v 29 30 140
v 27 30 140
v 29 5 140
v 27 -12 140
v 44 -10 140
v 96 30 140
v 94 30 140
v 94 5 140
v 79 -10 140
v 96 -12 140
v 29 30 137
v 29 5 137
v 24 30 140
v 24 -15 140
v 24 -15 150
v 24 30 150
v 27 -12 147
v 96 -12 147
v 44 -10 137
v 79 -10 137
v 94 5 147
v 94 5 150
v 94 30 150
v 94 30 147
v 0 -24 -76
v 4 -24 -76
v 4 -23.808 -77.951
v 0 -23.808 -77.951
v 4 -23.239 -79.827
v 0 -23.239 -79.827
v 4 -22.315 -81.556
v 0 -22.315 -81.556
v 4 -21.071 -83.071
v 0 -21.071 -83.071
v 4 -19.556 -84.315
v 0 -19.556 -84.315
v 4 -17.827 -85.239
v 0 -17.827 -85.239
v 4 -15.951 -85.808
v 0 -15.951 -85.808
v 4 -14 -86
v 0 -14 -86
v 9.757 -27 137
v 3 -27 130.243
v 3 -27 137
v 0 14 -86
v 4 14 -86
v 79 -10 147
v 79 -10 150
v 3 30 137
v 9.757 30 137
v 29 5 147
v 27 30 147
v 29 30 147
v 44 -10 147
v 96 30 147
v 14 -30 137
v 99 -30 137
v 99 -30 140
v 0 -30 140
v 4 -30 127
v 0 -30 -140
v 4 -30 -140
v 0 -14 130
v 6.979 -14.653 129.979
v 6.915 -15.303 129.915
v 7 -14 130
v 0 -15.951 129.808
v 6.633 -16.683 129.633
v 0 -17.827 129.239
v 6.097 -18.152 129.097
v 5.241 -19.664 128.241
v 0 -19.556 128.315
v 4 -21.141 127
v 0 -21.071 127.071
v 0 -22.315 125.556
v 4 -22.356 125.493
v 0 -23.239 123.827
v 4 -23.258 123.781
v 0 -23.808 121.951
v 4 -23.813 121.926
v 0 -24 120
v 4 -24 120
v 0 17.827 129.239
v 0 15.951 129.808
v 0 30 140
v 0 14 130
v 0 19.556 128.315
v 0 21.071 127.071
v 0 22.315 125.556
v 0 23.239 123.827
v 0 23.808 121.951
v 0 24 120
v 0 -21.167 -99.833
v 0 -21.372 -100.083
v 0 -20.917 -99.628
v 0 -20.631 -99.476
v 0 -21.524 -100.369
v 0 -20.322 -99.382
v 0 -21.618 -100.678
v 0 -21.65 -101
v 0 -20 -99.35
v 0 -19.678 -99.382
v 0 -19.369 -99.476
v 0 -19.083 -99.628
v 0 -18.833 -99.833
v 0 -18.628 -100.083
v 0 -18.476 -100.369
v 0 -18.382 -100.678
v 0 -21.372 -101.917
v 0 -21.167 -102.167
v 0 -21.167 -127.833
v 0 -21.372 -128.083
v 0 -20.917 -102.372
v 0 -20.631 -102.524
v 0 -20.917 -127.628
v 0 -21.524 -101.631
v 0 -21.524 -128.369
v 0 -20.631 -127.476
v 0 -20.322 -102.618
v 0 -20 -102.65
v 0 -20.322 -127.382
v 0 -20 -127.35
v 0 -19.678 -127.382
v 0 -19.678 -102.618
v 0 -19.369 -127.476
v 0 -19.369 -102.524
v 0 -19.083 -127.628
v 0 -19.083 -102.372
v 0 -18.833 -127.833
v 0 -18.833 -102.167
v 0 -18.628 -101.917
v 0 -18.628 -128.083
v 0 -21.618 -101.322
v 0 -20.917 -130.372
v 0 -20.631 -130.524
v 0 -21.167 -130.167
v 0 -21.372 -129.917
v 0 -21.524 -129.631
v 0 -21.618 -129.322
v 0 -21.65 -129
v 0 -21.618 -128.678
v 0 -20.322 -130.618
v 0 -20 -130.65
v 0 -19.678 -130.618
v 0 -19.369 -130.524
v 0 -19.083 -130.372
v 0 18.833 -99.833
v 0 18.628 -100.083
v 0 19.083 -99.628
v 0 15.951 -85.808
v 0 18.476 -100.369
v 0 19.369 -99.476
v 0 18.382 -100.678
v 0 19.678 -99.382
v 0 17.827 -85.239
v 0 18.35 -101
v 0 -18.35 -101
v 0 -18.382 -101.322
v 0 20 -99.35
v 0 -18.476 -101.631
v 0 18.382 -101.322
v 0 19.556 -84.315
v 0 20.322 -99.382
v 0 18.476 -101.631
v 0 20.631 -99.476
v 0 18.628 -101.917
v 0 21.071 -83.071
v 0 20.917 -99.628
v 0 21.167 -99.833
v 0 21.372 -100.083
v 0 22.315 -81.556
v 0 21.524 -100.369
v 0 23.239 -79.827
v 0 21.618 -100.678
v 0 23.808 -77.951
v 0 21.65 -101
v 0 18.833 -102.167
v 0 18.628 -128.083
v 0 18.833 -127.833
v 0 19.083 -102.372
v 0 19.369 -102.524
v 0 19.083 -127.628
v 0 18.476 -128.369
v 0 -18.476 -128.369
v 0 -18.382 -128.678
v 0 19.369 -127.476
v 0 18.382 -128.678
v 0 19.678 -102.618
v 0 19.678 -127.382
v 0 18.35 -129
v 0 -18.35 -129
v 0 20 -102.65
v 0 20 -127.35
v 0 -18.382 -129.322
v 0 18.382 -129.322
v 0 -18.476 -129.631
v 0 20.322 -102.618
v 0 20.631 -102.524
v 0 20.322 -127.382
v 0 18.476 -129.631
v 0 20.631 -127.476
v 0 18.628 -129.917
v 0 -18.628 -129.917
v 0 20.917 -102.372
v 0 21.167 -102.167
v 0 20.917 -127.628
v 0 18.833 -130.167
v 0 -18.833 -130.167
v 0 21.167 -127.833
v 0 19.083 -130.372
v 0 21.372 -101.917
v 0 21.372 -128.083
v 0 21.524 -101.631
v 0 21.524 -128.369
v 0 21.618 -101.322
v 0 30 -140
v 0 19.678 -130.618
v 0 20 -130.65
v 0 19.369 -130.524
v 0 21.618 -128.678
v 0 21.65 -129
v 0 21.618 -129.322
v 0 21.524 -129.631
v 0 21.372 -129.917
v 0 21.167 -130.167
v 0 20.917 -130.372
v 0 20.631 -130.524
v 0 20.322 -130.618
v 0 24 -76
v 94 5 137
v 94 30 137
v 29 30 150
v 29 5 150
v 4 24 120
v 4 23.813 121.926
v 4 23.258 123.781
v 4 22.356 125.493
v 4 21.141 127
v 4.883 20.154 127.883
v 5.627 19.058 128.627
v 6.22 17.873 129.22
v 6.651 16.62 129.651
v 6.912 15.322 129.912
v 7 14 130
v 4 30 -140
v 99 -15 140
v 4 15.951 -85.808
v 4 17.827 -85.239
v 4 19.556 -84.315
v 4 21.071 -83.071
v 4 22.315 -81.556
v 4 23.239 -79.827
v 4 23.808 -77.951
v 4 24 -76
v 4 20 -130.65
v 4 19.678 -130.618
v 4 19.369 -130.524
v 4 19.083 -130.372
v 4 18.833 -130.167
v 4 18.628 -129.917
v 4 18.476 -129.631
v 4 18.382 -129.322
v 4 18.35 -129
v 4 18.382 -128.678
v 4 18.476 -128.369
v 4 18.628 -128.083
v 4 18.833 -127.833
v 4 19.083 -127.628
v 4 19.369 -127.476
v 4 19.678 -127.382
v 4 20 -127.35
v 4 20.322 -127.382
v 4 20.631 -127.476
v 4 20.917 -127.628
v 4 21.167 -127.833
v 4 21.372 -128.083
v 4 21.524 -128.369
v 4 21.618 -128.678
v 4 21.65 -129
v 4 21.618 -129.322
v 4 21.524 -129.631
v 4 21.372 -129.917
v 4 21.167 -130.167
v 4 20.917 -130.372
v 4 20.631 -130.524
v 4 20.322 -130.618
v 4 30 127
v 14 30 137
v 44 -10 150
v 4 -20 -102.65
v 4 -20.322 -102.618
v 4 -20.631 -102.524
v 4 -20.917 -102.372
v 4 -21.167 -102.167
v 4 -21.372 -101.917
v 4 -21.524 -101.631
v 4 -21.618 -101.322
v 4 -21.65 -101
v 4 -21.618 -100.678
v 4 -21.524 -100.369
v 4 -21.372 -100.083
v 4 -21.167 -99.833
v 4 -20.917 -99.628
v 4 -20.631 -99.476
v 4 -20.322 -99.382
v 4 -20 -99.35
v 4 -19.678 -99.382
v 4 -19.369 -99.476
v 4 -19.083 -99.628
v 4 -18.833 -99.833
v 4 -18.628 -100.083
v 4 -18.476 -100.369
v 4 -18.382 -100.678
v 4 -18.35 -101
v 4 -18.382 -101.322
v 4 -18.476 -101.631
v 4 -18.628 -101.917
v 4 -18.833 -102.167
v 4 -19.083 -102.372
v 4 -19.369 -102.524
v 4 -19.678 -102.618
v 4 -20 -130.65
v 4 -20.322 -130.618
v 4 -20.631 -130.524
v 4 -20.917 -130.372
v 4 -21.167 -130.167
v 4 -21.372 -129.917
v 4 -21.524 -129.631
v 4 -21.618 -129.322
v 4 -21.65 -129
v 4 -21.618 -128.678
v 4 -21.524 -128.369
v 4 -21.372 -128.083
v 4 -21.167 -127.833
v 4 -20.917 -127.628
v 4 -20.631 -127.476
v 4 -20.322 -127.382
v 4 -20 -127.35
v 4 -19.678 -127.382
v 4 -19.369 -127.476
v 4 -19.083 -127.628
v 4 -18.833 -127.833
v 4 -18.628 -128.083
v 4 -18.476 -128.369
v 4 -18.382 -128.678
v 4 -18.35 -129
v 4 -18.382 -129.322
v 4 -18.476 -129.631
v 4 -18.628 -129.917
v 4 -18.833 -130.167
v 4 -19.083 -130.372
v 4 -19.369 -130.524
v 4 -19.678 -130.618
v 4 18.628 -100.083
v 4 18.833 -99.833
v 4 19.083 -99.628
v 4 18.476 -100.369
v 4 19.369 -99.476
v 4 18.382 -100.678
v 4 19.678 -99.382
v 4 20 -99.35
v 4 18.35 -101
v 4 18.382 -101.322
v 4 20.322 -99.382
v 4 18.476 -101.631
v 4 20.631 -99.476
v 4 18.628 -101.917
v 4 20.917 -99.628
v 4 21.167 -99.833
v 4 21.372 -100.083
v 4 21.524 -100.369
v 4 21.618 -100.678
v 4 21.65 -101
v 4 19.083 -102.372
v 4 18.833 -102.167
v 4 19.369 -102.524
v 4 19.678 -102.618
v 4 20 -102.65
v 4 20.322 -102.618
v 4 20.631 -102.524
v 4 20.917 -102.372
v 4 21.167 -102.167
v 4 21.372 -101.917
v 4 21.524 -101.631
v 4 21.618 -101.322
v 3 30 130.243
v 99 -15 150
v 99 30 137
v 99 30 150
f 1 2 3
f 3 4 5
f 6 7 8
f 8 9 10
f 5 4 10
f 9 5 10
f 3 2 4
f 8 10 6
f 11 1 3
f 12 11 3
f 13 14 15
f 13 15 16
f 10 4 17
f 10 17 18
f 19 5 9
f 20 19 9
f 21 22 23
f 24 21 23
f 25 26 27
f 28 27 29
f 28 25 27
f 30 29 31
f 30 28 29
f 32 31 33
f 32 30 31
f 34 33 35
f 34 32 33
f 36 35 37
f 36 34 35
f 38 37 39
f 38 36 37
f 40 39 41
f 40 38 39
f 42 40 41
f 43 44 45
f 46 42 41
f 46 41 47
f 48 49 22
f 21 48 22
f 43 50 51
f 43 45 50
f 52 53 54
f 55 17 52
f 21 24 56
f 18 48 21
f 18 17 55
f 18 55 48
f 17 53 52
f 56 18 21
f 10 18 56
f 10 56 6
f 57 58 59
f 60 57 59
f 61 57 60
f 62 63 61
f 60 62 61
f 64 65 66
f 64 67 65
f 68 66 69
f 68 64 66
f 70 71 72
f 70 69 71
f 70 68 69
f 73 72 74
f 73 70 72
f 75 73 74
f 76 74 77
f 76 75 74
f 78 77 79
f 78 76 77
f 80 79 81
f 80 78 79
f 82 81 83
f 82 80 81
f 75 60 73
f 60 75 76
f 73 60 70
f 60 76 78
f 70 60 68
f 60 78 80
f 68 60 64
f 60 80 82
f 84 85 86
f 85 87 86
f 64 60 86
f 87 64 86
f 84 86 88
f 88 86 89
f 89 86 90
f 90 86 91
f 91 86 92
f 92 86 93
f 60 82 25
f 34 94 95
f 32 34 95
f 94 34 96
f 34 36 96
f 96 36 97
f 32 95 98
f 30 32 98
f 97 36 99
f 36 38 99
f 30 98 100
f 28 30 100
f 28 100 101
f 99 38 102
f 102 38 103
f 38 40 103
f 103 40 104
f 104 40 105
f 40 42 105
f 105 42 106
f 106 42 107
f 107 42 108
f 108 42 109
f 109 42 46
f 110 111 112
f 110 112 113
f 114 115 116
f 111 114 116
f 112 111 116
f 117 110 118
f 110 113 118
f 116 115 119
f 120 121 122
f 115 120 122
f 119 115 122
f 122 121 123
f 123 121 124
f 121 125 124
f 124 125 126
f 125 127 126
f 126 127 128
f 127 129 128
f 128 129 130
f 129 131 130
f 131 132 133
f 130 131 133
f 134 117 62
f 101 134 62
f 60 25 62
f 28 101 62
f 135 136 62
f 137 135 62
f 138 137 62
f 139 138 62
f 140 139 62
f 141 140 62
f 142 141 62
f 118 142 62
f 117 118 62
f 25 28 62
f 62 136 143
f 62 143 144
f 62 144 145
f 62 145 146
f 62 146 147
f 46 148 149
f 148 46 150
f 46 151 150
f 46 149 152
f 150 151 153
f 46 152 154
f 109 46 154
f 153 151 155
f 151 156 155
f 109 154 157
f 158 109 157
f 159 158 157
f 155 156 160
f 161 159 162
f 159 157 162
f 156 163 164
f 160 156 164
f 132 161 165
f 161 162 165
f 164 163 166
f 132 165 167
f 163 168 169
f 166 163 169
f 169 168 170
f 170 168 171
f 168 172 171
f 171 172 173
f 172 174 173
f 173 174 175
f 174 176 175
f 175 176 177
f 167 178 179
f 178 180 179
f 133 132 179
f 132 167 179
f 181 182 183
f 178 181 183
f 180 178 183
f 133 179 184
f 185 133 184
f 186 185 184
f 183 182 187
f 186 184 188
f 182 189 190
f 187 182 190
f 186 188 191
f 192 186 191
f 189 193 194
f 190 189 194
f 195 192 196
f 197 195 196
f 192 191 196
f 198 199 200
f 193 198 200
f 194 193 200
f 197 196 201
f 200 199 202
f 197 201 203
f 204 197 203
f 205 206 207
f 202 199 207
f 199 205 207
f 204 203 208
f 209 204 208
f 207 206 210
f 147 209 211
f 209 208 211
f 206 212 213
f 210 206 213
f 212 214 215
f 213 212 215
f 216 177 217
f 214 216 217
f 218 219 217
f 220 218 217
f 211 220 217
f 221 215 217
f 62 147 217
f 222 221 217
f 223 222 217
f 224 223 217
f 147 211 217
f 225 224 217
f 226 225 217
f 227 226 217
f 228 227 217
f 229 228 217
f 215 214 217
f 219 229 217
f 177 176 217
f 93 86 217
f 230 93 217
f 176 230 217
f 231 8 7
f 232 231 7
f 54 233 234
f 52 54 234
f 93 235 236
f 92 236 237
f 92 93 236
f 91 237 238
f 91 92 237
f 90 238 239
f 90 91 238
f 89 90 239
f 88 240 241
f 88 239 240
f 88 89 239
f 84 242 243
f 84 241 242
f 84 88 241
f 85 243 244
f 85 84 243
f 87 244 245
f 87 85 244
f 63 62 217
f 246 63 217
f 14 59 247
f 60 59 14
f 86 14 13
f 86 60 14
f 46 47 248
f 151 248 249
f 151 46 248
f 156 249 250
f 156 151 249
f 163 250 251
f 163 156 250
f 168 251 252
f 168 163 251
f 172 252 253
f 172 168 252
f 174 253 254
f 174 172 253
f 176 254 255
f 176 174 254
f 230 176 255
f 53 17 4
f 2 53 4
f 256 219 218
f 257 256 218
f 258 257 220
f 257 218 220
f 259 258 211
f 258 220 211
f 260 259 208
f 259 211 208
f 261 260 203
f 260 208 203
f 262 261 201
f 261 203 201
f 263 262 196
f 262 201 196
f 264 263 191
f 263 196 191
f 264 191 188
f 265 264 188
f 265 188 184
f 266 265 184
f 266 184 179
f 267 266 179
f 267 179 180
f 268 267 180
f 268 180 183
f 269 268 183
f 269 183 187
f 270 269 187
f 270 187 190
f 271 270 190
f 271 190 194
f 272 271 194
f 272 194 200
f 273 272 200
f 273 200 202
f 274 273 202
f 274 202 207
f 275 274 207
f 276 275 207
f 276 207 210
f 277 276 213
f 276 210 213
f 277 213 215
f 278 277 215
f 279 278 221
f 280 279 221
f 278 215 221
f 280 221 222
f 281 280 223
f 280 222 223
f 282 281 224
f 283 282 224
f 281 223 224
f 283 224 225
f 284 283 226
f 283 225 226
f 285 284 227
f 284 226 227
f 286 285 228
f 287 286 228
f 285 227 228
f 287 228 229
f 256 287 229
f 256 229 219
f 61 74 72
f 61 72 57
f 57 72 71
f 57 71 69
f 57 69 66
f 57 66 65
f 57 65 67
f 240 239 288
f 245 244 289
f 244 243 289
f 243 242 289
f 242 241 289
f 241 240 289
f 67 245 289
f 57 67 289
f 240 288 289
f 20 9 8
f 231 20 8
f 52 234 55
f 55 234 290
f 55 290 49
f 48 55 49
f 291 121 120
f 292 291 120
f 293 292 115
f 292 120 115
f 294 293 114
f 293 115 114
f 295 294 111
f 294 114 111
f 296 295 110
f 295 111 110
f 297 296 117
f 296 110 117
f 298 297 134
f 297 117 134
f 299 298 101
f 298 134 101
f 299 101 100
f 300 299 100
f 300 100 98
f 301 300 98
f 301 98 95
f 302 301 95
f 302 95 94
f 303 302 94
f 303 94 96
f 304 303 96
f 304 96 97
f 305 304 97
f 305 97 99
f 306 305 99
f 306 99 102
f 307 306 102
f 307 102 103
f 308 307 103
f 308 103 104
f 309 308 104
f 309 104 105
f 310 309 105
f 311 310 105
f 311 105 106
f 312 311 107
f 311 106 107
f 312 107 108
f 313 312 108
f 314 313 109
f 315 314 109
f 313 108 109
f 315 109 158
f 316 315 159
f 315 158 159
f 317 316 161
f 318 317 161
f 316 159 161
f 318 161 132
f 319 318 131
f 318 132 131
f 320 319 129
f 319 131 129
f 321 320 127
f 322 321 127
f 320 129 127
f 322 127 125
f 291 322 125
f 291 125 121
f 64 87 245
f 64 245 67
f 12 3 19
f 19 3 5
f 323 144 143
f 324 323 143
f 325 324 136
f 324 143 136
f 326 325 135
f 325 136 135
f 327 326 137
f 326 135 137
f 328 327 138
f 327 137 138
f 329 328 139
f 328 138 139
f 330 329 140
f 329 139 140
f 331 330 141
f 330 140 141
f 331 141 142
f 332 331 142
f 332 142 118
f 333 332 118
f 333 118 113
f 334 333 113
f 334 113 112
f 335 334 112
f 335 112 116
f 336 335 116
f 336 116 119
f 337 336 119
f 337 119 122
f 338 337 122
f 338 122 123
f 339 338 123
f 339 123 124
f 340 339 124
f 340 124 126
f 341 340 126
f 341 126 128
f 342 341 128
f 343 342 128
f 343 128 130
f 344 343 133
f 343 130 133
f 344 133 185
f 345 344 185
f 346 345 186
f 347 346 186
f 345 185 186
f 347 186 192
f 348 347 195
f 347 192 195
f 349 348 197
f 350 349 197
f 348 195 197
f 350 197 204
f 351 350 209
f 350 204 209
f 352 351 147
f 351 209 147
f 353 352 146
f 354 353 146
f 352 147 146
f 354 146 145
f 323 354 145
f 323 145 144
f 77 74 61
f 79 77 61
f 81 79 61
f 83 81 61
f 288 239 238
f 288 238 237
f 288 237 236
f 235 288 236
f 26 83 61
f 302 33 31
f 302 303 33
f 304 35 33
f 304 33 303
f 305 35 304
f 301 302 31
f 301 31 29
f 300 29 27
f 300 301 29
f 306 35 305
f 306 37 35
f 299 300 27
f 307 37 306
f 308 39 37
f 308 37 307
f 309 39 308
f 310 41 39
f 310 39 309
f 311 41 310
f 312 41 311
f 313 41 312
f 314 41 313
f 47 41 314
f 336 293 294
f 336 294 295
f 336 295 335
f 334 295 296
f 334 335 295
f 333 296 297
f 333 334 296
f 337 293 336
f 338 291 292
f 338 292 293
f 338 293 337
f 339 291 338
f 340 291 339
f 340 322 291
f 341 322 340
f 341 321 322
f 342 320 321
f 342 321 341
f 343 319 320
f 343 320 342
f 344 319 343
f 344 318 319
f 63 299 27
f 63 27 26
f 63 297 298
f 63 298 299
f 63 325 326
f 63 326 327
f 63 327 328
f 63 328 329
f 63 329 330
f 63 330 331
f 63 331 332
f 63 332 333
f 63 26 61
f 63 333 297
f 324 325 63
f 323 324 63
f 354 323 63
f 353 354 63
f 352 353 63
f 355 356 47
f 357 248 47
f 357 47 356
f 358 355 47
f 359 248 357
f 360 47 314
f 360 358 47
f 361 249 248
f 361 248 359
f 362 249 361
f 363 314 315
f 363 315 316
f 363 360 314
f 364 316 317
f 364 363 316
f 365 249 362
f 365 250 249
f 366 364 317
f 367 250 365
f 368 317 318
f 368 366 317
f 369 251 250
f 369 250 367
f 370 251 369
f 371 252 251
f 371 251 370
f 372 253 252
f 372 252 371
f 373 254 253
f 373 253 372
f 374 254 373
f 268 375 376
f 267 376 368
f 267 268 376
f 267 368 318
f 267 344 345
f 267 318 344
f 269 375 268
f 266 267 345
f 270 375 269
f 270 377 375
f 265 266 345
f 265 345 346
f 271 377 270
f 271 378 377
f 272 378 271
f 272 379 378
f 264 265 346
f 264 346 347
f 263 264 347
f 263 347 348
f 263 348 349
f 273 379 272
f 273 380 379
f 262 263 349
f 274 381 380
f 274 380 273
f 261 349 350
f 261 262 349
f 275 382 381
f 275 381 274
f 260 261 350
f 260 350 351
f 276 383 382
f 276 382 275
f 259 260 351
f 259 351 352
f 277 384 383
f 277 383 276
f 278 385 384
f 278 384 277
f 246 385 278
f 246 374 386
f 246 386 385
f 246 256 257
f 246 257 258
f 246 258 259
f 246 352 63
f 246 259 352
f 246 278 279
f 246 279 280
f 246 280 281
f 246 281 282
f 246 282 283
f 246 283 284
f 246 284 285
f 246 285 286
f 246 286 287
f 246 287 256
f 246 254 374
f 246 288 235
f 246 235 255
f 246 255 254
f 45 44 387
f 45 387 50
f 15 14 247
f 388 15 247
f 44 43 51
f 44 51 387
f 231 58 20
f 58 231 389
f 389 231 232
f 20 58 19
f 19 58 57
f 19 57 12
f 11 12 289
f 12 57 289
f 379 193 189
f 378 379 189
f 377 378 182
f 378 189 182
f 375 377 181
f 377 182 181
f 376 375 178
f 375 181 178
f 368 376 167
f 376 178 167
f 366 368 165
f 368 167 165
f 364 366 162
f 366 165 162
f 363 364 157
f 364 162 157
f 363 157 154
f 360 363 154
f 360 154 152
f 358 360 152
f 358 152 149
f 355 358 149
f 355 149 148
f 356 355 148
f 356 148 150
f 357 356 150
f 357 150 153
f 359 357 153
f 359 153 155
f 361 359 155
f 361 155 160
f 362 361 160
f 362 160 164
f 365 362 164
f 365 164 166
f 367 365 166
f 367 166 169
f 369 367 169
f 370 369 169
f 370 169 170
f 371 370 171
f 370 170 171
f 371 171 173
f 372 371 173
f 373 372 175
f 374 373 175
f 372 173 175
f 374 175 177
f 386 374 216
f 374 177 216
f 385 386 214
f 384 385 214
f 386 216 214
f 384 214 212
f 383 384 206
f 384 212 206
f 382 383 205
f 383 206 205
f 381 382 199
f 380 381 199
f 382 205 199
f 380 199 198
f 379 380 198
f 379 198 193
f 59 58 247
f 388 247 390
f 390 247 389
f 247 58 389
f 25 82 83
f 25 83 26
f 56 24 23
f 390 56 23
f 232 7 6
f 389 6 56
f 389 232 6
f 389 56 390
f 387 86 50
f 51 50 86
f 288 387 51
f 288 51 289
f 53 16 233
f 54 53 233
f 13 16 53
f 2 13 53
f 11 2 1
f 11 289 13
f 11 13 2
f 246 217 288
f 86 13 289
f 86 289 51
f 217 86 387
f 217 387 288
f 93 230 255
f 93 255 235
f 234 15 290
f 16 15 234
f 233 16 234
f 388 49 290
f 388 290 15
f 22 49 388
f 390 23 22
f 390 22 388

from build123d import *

# Parameters (mm, degrees)
SKETCH_1_W          = 280
SKETCH_1_H          = 60
EXTRUDE_1_DEPTH     = 4
HOLE_WIZARD_M4_1_D  = 3.3
SKETCH_10_W         = 3
SKETCH_10_H         = 60
EXTRUDE_4_DEPTH     = 95
EXTRUDE_8_DEPTH     = 60
SKETCH_14_W         = 75
SKETCH_14_H         = 45
EXTRUDE_10_DEPTH    = 10
SHELL_START         = -12
SHELL_1_OUTLINE_W   = 69
SHELL_1_OUTLINE_H   = 7
SHELL_1_DEPTH       = 42
SHELL_START_2       = -27
SHELL_1_2_DEPTH     = 15
CUT_EXTRUDE_2_REACH = 309.898
CUT_EXTRUDE_3_REACH = 184.211


# Read off the part's stored shape, not the designer's step: 抽壳1
with BuildPart() as part:
    # 草图1 → 凸台-拉伸1 (new body)
    with BuildSketch(Plane(origin=(0, 0, 0), x_dir=(0, 0, -1), z_dir=(1, 0, 0))):
        Rectangle(SKETCH_1_W, SKETCH_1_H)
    extrude(amount=EXTRUDE_1_DEPTH)

    # M4 螺纹孔1 (through all)
    with Locations(Plane(origin=(4, 20, -129), x_dir=(0, 0, 1), z_dir=(1, 0, 0))):
        with Locations((0, 0), (28, 0), (28, 40), (0, 40)):
            Hole(HOLE_WIZARD_M4_1_D / 2)

    # 草图10 → 凸台-拉伸4 (add)
    with BuildSketch(Plane(origin=(4, 0, 0), x_dir=(0, 0, -1), z_dir=(1, 0, 0))):
        with Locations((-138.5, 0)):
            Rectangle(SKETCH_10_W, SKETCH_10_H)
    extrude(amount=EXTRUDE_4_DEPTH)

    # 草图11 → 凸台-拉伸8 (add)
    with BuildSketch(Plane(origin=(0, 30, 0), x_dir=(1, 0, 0), z_dir=(0, 1, 0))):
        Polygon((4, -127), (14, -137), (4, -137), align=None)
    extrude(amount=-EXTRUDE_8_DEPTH)

    # 草图14 → 凸台-拉伸10 (add)
    with BuildSketch(Plane.XY.offset(140)):
        with Locations((61.5, 7.5)):
            Rectangle(SKETCH_14_W, SKETCH_14_H)
    extrude(amount=EXTRUDE_10_DEPTH)

    # 抽壳1 outline → 抽壳1 (cut)
    with BuildSketch(Plane(origin=(0, 0, 0), x_dir=(1, 0, 0), z_dir=(0, 1, 0)).offset(SHELL_START)):
        with Locations((61.5, -143.5)):
            Rectangle(SHELL_1_OUTLINE_W, SHELL_1_OUTLINE_H)
        Polygon((3, -137), (9.757359313, -137), (3, -130.242640687), align=None)
    extrude(amount=SHELL_1_DEPTH, mode=Mode.SUBTRACT)

    # Shell 1 2 outline → Shell 1 2 (cut)
    with BuildSketch(Plane(origin=(0, 0, 0), x_dir=(1, 0, 0), z_dir=(0, 1, 0)).offset(SHELL_START_2)):
        Polygon((3, -137), (9.757359313, -137), (3, -130.242640687), align=None)
    extrude(amount=SHELL_1_2_DEPTH, mode=Mode.SUBTRACT)

    # 切除-拉伸2: up to this face of the body (flat: up to its plane)
    cut_extrude_2_end = Plane(part.part.faces().sort_by_distance((56.5, 0, 137))[0])
    # 草图15 → 切除-拉伸2 (cut, up to the picked face)
    with BuildSketch(Plane.XY.offset(150), mode=Mode.PRIVATE) as cut_extrude_2_sk1:
        Polygon((61.5, 30), (29, 30), (29, 5), (44, -10), (61.5, -10), align=None)
    cut_extrude_2_tool1 = split(extrude(cut_extrude_2_sk1.sketch, amount=-CUT_EXTRUDE_2_REACH, mode=Mode.PRIVATE), bisect_by=cut_extrude_2_end, keep=Keep.BOTH, mode=Mode.PRIVATE)
    # 草图15 → 切除-拉伸2 (cut, up to the picked face)
    with BuildSketch(Plane.XY.offset(150), mode=Mode.PRIVATE) as cut_extrude_2_sk2:
        Polygon((94, 30), (61.5, 30), (61.5, -10), (79, -10), (94, 5), align=None)
    cut_extrude_2_tool2 = split(extrude(cut_extrude_2_sk2.sketch, amount=-CUT_EXTRUDE_2_REACH, mode=Mode.PRIVATE), bisect_by=cut_extrude_2_end, keep=Keep.BOTH, mode=Mode.PRIVATE)
    add(cut_extrude_2_tool1.solids().sort_by(Axis((46.315789, 11.421053, 150), (0, 0, -1)))[0], mode=Mode.SUBTRACT)
    add(cut_extrude_2_tool2.solids().sort_by(Axis((76.684211, 11.421053, 150), (0, 0, -1)))[0], mode=Mode.SUBTRACT)

    # 草图16 → 切除-拉伸3 (cut, up to next)
    with BuildSketch(Plane.ZY, mode=Mode.PRIVATE) as cut_extrude_3_sk1:
        with BuildLine():
            Line((-76, 24), (120, 24))
            ThreePointArc((120, 24), (127.071067812, 21.071067812), (130, 14))
            Line((130, 14), (130, -14))
            ThreePointArc((130, -14), (127.071067812, -21.071067812), (120, -24))
            Line((120, -24), (-76, -24))
            ThreePointArc((-76, -24), (-83.071067812, -21.071067812), (-86, -14))
            Line((-86, -14), (-86, 14))
            ThreePointArc((-86, 14), (-83.071067812, 21.071067812), (-76, 24))
        make_face()
    cut_extrude_3_tool1 = extrude(cut_extrude_3_sk1.sketch, amount=-CUT_EXTRUDE_3_REACH, mode=Mode.PRIVATE) & part.part
    add(cut_extrude_3_tool1.solids().sort_by_distance((0, 0, 22))[0], mode=Mode.SUBTRACT)


solid = part.part
